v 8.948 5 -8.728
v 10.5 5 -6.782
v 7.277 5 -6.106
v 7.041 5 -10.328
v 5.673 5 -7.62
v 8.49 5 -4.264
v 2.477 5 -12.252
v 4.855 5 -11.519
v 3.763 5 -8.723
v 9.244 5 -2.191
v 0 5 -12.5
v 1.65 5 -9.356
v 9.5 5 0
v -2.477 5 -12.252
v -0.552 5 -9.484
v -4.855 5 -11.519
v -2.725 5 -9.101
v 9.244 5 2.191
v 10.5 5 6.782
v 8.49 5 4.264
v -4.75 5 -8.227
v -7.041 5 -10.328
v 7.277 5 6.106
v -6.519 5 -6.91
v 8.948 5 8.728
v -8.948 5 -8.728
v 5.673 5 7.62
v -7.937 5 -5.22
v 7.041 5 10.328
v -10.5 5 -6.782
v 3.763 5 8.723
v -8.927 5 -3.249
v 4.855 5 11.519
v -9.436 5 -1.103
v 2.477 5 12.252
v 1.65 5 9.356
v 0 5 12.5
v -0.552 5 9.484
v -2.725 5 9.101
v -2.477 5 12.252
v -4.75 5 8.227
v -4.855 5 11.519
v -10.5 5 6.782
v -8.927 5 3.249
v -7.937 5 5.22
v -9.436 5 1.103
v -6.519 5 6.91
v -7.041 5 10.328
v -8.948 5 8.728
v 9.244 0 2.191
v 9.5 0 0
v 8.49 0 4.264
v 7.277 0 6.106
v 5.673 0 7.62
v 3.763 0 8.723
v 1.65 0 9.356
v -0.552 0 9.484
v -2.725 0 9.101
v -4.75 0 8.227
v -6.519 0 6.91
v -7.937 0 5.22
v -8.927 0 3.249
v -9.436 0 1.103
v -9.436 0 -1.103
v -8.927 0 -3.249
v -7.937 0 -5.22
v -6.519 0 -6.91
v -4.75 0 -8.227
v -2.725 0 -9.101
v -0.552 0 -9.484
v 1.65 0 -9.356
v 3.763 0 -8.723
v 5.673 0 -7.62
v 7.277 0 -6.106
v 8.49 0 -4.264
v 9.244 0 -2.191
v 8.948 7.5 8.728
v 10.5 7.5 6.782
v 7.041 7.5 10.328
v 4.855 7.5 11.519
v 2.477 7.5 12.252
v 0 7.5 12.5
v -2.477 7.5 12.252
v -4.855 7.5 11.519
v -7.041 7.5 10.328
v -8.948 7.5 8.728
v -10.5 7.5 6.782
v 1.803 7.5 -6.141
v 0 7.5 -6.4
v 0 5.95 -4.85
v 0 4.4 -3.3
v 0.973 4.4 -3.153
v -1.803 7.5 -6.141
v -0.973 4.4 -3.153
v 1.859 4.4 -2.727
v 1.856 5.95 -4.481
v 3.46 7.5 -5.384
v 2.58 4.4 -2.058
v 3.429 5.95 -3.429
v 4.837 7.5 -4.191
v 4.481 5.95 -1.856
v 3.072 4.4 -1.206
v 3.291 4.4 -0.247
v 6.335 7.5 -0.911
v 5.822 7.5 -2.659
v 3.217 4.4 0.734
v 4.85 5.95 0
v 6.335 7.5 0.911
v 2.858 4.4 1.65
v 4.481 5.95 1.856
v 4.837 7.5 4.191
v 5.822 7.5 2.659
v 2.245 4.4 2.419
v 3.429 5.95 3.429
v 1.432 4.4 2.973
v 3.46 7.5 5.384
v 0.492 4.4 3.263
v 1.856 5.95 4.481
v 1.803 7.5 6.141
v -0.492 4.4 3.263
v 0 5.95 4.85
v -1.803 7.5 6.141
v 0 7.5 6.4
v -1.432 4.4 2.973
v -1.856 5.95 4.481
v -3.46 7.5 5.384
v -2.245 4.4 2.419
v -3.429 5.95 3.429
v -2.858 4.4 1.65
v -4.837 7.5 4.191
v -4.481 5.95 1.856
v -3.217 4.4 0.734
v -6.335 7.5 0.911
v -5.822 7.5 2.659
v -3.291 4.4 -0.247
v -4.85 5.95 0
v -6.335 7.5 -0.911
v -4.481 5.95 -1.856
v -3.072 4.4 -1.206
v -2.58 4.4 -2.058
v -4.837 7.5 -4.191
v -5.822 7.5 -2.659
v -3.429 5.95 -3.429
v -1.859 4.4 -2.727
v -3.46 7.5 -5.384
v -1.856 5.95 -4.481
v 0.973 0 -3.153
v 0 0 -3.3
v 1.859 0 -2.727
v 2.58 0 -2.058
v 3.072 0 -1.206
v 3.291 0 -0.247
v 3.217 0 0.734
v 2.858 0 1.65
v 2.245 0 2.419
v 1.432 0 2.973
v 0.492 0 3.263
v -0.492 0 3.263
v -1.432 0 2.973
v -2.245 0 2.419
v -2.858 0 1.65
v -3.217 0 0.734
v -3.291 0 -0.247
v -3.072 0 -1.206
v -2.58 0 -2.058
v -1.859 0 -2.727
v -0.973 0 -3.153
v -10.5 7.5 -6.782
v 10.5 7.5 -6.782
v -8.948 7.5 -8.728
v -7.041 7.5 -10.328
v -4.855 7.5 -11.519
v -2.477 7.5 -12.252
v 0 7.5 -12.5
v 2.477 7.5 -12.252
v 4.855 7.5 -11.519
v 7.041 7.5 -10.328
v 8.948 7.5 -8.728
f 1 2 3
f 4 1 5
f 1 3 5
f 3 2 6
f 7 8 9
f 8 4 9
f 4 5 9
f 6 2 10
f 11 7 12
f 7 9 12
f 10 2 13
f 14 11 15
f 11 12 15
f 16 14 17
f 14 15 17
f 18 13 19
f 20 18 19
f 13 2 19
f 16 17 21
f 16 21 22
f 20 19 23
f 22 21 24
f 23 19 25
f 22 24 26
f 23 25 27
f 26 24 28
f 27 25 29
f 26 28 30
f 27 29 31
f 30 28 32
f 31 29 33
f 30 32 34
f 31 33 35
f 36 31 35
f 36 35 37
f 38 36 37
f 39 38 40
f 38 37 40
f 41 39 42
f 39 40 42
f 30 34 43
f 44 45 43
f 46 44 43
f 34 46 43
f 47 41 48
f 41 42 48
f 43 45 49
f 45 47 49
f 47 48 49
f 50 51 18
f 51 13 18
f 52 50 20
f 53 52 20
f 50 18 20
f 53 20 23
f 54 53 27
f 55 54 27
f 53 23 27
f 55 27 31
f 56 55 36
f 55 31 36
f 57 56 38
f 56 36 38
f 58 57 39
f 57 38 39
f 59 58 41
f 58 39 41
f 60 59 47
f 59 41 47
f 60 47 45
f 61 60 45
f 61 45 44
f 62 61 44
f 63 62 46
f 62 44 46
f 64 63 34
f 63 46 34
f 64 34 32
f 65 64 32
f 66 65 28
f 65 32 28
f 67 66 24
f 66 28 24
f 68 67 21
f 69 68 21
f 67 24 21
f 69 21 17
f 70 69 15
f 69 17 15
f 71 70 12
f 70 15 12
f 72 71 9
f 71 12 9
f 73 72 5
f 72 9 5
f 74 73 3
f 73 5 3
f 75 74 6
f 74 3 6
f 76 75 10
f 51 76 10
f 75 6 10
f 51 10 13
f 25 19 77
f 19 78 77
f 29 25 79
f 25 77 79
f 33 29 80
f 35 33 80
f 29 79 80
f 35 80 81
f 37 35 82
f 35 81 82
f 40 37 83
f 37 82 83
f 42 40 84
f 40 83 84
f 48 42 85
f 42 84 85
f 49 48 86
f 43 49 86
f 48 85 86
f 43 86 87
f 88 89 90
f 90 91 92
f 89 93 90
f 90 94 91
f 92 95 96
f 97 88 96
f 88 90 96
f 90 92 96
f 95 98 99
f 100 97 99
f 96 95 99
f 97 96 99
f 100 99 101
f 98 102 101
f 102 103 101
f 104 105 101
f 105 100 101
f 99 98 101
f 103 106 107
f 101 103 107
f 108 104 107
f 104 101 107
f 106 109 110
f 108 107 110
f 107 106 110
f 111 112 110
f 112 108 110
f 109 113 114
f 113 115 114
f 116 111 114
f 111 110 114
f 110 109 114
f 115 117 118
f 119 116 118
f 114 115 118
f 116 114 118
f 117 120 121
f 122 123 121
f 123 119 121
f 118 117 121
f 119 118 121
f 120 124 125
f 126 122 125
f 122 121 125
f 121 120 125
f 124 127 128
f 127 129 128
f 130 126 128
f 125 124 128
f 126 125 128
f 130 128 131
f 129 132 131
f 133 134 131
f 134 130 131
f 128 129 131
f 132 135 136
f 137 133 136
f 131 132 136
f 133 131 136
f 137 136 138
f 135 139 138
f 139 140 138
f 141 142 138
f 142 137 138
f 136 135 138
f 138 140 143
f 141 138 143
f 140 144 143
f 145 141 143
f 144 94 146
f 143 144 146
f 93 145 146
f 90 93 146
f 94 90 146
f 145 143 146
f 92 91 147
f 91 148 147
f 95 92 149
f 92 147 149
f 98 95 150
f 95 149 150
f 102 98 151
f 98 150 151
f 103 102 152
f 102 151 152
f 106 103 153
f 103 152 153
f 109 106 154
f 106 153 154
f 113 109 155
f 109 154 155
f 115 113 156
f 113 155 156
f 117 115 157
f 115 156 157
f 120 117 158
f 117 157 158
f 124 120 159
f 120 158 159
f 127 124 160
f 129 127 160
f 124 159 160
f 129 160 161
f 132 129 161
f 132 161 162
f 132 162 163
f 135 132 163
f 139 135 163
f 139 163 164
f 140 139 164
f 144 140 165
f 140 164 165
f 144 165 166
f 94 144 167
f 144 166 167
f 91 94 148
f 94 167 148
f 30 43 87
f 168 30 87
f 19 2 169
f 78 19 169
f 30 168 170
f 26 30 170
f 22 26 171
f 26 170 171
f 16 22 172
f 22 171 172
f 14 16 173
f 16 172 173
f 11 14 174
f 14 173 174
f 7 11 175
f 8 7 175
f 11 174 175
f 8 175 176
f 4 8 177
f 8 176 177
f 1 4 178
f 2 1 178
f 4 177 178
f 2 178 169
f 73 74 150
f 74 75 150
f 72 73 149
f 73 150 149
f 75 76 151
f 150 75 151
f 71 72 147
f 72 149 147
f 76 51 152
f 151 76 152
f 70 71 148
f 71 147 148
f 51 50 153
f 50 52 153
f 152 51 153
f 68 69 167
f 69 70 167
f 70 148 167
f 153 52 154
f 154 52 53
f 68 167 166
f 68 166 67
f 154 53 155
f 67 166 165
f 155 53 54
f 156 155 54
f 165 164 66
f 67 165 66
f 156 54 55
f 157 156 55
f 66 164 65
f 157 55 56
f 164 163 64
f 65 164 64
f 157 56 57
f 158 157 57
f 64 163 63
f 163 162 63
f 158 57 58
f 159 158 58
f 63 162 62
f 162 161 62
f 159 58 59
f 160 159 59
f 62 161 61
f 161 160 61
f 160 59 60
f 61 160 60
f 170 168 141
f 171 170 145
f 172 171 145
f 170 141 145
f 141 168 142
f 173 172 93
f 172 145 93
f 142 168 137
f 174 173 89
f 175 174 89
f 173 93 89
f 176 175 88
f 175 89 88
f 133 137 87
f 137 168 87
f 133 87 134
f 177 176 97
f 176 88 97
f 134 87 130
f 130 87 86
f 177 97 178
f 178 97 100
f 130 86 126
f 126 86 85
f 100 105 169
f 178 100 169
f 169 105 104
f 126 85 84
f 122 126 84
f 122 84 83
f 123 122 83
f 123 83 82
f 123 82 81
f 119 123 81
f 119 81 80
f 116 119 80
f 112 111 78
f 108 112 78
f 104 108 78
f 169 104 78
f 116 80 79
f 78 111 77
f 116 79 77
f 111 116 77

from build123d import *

# Parameters (mm, degrees)
HOLE_WIZARD_1_D           = 6.6
HOLE_WIZARD_1_CSINK_D     = 12.8
HOLE_WIZARD_1_CSINK_ANGLE = 90
SKETCH_3_W                = 2
SKETCH_3_H                = 2.5
CUT_EXTRUDE_1_DEPTH       = 13.5
CUT_EXTRUDE_1_DEPTH_BACK  = 13.5


with BuildPart() as part:
    # 草图1 → 旋转1 (revolve)
    with BuildSketch(Plane.XY):
        Polygon((0, 0), (9.5, 0), (9.5, 5), (12.5, 5), (12.5, 7.5), (0, 7.5), align=None)
    revolve(axis=Axis((0, 11.114035088, 0), (0, -1, 0)))

    # 打孔尺寸(%根据)内六角花形半沉头螺钉的类型1 (through all)
    with Locations(Plane.ZX.offset(7.5)):
        with Locations((0, 0)):
            CounterSinkHole(HOLE_WIZARD_1_D / 2, HOLE_WIZARD_1_CSINK_D / 2, counter_sink_angle=HOLE_WIZARD_1_CSINK_ANGLE)

    # 草图3 → 切除-拉伸1 (cut, two sides)
    with BuildSketch(Plane.XY) as cut_extrude_1_sk:
        with Locations((-11.5, 6.25)):
            Rectangle(SKETCH_3_W, SKETCH_3_H)
        with Locations((11.5, 6.25)):
            Rectangle(SKETCH_3_W, SKETCH_3_H)
    extrude(amount=CUT_EXTRUDE_1_DEPTH, mode=Mode.SUBTRACT)
    extrude(cut_extrude_1_sk.sketch, amount=-CUT_EXTRUDE_1_DEPTH_BACK, mode=Mode.SUBTRACT)


solid = part.part
